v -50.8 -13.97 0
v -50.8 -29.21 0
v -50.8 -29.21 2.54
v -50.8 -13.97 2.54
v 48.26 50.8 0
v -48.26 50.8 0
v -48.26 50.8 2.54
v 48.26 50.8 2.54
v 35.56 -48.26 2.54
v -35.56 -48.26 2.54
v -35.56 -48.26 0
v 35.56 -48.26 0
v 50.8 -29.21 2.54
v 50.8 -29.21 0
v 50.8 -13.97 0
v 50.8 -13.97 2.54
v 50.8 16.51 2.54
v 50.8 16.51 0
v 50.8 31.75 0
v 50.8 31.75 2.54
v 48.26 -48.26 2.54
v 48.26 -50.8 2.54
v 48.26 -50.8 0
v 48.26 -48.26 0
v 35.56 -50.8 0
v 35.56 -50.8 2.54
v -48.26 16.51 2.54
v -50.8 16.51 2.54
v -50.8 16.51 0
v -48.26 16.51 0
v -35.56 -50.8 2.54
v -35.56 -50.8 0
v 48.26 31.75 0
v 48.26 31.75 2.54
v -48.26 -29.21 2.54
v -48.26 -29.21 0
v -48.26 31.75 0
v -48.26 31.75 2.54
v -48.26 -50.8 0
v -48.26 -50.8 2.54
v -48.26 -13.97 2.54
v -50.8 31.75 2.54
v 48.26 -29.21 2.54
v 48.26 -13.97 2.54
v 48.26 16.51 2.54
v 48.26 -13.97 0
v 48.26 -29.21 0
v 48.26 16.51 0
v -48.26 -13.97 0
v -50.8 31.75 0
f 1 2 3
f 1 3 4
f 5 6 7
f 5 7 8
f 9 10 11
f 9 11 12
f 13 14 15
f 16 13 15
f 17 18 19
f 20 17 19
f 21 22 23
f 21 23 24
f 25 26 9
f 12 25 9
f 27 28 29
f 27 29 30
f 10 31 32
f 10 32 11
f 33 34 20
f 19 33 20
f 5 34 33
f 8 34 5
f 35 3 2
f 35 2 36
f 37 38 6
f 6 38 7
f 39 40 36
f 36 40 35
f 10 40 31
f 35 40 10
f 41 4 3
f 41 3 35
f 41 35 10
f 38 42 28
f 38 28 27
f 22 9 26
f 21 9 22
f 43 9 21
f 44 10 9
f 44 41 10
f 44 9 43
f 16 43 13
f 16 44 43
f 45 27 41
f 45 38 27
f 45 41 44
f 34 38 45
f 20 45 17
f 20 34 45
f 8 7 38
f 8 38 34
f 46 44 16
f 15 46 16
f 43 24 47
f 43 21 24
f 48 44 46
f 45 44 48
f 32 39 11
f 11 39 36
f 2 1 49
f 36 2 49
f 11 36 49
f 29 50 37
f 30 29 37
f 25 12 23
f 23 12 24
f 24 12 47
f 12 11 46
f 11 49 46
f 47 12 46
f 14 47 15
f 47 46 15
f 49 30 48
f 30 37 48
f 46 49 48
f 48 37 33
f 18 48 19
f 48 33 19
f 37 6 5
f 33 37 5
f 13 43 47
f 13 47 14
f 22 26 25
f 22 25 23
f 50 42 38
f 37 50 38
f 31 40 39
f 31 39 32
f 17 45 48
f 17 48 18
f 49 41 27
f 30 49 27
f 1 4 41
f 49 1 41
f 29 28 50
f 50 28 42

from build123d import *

# Parameters (mm, degrees)
F0_W      = 101.6
F0_H      = 101.6
F1_DEPTH  = 2.54
F3_DEPTH  = 2.54
F4_W      = 2.54
F4_H      = 16.51
F4_H_2    = 30.48
F4_H_3    = 21.59
F5_DEPTH  = 25.4
F6_W      = 8.149925
F6_H      = 6.423097
F6_W_2    = 6.710898
F7_DEPTH  = 25.4
F8_W      = 12.7
F8_H      = 2.54
F9_DEPTH  = 2.54
F10_W     = 2.54
F10_H     = 2.54
F11_DEPTH = 2.54
F12_W     = 2.54
F12_H     = 2.54
F13_DEPTH = 25.4


with BuildPart() as f1:
    # F0 (on Top) → F1 (new body)
    with BuildSketch(Plane.XY):
        Rectangle(F0_W, F0_H)
    extrude(amount=F1_DEPTH)

    # F2 (on face) → F3 (cut)
    with BuildSketch(Plane.XZ.offset(50.8)):
        Polygon((-41.91, 2.54), (-39.37, 0), (39.37, 0), (41.91, 2.54), align=None)
    extrude(amount=-F3_DEPTH, mode=Mode.SUBTRACT)

    # F4 (on face) → F5 (cut)
    with BuildSketch(Plane.XY.offset(2.54)):
        with Locations((-49.53, -40.005)):
            Rectangle(F4_W, F4_H)
        with Locations((-49.53, -1.27)):
            Rectangle(F4_W, F4_H_2)
        with Locations((-49.53, 40.005)):
            Rectangle(F4_W, F4_H_3)
        with Locations((49.53, -40.005)):
            Rectangle(F4_W, F4_H)
        with Locations((49.53, -1.27)):
            Rectangle(F4_W, F4_H_2)
        with Locations((49.53, 40.005)):
            Rectangle(F4_W, F4_H_3)
    extrude(amount=-F5_DEPTH, mode=Mode.SUBTRACT)

    # F6 (on face) → F7 (cut)
    with BuildSketch(Plane.XY.offset(2.54)):
        with Locations((52.334962, -51.471548)):
            Rectangle(F6_W, F6_H)
        with Locations((-51.615449, -51.471548)):
            Rectangle(F6_W_2, F6_H)
    extrude(amount=-F7_DEPTH, mode=Mode.SUBTRACT)

    # F8 (on face) → F9 (join)
    with BuildSketch(Plane.XY.offset(2.54)):
        with Locations((41.91, -49.53)):
            Rectangle(F8_W, F8_H)
        with Locations((-41.91, -49.53)):
            Rectangle(F8_W, F8_H)
    extrude(amount=-F9_DEPTH)

    # F10 (on face) → F11 (join)
    with BuildSketch(Plane.XY.offset(2.54)):
        with Locations((-49.53, 30.48)):
            Rectangle(F10_W, F10_H)
        with Locations((-49.53, -15.24)):
            Rectangle(F10_W, F10_H)
        with Locations((49.53, -15.24)):
            Rectangle(F10_W, F10_H)
        with Locations((49.53, 30.48)):
            Rectangle(F10_W, F10_H)
    extrude(amount=-F11_DEPTH)

    # F12 (on face) → F13 (cut)
    with BuildSketch(Plane.XY.offset(2.54)):
        with Locations((49.53, -30.48)):
            Rectangle(F12_W, F12_H)
        with Locations((49.53, 15.24)):
            Rectangle(F12_W, F12_H)
        with Locations((-49.53, -30.48)):
            Rectangle(F12_W, F12_H)
        with Locations((-49.53, 15.24)):
            Rectangle(F12_W, F12_H)
    extrude(amount=-F13_DEPTH, mode=Mode.SUBTRACT)


solid = f1.part
